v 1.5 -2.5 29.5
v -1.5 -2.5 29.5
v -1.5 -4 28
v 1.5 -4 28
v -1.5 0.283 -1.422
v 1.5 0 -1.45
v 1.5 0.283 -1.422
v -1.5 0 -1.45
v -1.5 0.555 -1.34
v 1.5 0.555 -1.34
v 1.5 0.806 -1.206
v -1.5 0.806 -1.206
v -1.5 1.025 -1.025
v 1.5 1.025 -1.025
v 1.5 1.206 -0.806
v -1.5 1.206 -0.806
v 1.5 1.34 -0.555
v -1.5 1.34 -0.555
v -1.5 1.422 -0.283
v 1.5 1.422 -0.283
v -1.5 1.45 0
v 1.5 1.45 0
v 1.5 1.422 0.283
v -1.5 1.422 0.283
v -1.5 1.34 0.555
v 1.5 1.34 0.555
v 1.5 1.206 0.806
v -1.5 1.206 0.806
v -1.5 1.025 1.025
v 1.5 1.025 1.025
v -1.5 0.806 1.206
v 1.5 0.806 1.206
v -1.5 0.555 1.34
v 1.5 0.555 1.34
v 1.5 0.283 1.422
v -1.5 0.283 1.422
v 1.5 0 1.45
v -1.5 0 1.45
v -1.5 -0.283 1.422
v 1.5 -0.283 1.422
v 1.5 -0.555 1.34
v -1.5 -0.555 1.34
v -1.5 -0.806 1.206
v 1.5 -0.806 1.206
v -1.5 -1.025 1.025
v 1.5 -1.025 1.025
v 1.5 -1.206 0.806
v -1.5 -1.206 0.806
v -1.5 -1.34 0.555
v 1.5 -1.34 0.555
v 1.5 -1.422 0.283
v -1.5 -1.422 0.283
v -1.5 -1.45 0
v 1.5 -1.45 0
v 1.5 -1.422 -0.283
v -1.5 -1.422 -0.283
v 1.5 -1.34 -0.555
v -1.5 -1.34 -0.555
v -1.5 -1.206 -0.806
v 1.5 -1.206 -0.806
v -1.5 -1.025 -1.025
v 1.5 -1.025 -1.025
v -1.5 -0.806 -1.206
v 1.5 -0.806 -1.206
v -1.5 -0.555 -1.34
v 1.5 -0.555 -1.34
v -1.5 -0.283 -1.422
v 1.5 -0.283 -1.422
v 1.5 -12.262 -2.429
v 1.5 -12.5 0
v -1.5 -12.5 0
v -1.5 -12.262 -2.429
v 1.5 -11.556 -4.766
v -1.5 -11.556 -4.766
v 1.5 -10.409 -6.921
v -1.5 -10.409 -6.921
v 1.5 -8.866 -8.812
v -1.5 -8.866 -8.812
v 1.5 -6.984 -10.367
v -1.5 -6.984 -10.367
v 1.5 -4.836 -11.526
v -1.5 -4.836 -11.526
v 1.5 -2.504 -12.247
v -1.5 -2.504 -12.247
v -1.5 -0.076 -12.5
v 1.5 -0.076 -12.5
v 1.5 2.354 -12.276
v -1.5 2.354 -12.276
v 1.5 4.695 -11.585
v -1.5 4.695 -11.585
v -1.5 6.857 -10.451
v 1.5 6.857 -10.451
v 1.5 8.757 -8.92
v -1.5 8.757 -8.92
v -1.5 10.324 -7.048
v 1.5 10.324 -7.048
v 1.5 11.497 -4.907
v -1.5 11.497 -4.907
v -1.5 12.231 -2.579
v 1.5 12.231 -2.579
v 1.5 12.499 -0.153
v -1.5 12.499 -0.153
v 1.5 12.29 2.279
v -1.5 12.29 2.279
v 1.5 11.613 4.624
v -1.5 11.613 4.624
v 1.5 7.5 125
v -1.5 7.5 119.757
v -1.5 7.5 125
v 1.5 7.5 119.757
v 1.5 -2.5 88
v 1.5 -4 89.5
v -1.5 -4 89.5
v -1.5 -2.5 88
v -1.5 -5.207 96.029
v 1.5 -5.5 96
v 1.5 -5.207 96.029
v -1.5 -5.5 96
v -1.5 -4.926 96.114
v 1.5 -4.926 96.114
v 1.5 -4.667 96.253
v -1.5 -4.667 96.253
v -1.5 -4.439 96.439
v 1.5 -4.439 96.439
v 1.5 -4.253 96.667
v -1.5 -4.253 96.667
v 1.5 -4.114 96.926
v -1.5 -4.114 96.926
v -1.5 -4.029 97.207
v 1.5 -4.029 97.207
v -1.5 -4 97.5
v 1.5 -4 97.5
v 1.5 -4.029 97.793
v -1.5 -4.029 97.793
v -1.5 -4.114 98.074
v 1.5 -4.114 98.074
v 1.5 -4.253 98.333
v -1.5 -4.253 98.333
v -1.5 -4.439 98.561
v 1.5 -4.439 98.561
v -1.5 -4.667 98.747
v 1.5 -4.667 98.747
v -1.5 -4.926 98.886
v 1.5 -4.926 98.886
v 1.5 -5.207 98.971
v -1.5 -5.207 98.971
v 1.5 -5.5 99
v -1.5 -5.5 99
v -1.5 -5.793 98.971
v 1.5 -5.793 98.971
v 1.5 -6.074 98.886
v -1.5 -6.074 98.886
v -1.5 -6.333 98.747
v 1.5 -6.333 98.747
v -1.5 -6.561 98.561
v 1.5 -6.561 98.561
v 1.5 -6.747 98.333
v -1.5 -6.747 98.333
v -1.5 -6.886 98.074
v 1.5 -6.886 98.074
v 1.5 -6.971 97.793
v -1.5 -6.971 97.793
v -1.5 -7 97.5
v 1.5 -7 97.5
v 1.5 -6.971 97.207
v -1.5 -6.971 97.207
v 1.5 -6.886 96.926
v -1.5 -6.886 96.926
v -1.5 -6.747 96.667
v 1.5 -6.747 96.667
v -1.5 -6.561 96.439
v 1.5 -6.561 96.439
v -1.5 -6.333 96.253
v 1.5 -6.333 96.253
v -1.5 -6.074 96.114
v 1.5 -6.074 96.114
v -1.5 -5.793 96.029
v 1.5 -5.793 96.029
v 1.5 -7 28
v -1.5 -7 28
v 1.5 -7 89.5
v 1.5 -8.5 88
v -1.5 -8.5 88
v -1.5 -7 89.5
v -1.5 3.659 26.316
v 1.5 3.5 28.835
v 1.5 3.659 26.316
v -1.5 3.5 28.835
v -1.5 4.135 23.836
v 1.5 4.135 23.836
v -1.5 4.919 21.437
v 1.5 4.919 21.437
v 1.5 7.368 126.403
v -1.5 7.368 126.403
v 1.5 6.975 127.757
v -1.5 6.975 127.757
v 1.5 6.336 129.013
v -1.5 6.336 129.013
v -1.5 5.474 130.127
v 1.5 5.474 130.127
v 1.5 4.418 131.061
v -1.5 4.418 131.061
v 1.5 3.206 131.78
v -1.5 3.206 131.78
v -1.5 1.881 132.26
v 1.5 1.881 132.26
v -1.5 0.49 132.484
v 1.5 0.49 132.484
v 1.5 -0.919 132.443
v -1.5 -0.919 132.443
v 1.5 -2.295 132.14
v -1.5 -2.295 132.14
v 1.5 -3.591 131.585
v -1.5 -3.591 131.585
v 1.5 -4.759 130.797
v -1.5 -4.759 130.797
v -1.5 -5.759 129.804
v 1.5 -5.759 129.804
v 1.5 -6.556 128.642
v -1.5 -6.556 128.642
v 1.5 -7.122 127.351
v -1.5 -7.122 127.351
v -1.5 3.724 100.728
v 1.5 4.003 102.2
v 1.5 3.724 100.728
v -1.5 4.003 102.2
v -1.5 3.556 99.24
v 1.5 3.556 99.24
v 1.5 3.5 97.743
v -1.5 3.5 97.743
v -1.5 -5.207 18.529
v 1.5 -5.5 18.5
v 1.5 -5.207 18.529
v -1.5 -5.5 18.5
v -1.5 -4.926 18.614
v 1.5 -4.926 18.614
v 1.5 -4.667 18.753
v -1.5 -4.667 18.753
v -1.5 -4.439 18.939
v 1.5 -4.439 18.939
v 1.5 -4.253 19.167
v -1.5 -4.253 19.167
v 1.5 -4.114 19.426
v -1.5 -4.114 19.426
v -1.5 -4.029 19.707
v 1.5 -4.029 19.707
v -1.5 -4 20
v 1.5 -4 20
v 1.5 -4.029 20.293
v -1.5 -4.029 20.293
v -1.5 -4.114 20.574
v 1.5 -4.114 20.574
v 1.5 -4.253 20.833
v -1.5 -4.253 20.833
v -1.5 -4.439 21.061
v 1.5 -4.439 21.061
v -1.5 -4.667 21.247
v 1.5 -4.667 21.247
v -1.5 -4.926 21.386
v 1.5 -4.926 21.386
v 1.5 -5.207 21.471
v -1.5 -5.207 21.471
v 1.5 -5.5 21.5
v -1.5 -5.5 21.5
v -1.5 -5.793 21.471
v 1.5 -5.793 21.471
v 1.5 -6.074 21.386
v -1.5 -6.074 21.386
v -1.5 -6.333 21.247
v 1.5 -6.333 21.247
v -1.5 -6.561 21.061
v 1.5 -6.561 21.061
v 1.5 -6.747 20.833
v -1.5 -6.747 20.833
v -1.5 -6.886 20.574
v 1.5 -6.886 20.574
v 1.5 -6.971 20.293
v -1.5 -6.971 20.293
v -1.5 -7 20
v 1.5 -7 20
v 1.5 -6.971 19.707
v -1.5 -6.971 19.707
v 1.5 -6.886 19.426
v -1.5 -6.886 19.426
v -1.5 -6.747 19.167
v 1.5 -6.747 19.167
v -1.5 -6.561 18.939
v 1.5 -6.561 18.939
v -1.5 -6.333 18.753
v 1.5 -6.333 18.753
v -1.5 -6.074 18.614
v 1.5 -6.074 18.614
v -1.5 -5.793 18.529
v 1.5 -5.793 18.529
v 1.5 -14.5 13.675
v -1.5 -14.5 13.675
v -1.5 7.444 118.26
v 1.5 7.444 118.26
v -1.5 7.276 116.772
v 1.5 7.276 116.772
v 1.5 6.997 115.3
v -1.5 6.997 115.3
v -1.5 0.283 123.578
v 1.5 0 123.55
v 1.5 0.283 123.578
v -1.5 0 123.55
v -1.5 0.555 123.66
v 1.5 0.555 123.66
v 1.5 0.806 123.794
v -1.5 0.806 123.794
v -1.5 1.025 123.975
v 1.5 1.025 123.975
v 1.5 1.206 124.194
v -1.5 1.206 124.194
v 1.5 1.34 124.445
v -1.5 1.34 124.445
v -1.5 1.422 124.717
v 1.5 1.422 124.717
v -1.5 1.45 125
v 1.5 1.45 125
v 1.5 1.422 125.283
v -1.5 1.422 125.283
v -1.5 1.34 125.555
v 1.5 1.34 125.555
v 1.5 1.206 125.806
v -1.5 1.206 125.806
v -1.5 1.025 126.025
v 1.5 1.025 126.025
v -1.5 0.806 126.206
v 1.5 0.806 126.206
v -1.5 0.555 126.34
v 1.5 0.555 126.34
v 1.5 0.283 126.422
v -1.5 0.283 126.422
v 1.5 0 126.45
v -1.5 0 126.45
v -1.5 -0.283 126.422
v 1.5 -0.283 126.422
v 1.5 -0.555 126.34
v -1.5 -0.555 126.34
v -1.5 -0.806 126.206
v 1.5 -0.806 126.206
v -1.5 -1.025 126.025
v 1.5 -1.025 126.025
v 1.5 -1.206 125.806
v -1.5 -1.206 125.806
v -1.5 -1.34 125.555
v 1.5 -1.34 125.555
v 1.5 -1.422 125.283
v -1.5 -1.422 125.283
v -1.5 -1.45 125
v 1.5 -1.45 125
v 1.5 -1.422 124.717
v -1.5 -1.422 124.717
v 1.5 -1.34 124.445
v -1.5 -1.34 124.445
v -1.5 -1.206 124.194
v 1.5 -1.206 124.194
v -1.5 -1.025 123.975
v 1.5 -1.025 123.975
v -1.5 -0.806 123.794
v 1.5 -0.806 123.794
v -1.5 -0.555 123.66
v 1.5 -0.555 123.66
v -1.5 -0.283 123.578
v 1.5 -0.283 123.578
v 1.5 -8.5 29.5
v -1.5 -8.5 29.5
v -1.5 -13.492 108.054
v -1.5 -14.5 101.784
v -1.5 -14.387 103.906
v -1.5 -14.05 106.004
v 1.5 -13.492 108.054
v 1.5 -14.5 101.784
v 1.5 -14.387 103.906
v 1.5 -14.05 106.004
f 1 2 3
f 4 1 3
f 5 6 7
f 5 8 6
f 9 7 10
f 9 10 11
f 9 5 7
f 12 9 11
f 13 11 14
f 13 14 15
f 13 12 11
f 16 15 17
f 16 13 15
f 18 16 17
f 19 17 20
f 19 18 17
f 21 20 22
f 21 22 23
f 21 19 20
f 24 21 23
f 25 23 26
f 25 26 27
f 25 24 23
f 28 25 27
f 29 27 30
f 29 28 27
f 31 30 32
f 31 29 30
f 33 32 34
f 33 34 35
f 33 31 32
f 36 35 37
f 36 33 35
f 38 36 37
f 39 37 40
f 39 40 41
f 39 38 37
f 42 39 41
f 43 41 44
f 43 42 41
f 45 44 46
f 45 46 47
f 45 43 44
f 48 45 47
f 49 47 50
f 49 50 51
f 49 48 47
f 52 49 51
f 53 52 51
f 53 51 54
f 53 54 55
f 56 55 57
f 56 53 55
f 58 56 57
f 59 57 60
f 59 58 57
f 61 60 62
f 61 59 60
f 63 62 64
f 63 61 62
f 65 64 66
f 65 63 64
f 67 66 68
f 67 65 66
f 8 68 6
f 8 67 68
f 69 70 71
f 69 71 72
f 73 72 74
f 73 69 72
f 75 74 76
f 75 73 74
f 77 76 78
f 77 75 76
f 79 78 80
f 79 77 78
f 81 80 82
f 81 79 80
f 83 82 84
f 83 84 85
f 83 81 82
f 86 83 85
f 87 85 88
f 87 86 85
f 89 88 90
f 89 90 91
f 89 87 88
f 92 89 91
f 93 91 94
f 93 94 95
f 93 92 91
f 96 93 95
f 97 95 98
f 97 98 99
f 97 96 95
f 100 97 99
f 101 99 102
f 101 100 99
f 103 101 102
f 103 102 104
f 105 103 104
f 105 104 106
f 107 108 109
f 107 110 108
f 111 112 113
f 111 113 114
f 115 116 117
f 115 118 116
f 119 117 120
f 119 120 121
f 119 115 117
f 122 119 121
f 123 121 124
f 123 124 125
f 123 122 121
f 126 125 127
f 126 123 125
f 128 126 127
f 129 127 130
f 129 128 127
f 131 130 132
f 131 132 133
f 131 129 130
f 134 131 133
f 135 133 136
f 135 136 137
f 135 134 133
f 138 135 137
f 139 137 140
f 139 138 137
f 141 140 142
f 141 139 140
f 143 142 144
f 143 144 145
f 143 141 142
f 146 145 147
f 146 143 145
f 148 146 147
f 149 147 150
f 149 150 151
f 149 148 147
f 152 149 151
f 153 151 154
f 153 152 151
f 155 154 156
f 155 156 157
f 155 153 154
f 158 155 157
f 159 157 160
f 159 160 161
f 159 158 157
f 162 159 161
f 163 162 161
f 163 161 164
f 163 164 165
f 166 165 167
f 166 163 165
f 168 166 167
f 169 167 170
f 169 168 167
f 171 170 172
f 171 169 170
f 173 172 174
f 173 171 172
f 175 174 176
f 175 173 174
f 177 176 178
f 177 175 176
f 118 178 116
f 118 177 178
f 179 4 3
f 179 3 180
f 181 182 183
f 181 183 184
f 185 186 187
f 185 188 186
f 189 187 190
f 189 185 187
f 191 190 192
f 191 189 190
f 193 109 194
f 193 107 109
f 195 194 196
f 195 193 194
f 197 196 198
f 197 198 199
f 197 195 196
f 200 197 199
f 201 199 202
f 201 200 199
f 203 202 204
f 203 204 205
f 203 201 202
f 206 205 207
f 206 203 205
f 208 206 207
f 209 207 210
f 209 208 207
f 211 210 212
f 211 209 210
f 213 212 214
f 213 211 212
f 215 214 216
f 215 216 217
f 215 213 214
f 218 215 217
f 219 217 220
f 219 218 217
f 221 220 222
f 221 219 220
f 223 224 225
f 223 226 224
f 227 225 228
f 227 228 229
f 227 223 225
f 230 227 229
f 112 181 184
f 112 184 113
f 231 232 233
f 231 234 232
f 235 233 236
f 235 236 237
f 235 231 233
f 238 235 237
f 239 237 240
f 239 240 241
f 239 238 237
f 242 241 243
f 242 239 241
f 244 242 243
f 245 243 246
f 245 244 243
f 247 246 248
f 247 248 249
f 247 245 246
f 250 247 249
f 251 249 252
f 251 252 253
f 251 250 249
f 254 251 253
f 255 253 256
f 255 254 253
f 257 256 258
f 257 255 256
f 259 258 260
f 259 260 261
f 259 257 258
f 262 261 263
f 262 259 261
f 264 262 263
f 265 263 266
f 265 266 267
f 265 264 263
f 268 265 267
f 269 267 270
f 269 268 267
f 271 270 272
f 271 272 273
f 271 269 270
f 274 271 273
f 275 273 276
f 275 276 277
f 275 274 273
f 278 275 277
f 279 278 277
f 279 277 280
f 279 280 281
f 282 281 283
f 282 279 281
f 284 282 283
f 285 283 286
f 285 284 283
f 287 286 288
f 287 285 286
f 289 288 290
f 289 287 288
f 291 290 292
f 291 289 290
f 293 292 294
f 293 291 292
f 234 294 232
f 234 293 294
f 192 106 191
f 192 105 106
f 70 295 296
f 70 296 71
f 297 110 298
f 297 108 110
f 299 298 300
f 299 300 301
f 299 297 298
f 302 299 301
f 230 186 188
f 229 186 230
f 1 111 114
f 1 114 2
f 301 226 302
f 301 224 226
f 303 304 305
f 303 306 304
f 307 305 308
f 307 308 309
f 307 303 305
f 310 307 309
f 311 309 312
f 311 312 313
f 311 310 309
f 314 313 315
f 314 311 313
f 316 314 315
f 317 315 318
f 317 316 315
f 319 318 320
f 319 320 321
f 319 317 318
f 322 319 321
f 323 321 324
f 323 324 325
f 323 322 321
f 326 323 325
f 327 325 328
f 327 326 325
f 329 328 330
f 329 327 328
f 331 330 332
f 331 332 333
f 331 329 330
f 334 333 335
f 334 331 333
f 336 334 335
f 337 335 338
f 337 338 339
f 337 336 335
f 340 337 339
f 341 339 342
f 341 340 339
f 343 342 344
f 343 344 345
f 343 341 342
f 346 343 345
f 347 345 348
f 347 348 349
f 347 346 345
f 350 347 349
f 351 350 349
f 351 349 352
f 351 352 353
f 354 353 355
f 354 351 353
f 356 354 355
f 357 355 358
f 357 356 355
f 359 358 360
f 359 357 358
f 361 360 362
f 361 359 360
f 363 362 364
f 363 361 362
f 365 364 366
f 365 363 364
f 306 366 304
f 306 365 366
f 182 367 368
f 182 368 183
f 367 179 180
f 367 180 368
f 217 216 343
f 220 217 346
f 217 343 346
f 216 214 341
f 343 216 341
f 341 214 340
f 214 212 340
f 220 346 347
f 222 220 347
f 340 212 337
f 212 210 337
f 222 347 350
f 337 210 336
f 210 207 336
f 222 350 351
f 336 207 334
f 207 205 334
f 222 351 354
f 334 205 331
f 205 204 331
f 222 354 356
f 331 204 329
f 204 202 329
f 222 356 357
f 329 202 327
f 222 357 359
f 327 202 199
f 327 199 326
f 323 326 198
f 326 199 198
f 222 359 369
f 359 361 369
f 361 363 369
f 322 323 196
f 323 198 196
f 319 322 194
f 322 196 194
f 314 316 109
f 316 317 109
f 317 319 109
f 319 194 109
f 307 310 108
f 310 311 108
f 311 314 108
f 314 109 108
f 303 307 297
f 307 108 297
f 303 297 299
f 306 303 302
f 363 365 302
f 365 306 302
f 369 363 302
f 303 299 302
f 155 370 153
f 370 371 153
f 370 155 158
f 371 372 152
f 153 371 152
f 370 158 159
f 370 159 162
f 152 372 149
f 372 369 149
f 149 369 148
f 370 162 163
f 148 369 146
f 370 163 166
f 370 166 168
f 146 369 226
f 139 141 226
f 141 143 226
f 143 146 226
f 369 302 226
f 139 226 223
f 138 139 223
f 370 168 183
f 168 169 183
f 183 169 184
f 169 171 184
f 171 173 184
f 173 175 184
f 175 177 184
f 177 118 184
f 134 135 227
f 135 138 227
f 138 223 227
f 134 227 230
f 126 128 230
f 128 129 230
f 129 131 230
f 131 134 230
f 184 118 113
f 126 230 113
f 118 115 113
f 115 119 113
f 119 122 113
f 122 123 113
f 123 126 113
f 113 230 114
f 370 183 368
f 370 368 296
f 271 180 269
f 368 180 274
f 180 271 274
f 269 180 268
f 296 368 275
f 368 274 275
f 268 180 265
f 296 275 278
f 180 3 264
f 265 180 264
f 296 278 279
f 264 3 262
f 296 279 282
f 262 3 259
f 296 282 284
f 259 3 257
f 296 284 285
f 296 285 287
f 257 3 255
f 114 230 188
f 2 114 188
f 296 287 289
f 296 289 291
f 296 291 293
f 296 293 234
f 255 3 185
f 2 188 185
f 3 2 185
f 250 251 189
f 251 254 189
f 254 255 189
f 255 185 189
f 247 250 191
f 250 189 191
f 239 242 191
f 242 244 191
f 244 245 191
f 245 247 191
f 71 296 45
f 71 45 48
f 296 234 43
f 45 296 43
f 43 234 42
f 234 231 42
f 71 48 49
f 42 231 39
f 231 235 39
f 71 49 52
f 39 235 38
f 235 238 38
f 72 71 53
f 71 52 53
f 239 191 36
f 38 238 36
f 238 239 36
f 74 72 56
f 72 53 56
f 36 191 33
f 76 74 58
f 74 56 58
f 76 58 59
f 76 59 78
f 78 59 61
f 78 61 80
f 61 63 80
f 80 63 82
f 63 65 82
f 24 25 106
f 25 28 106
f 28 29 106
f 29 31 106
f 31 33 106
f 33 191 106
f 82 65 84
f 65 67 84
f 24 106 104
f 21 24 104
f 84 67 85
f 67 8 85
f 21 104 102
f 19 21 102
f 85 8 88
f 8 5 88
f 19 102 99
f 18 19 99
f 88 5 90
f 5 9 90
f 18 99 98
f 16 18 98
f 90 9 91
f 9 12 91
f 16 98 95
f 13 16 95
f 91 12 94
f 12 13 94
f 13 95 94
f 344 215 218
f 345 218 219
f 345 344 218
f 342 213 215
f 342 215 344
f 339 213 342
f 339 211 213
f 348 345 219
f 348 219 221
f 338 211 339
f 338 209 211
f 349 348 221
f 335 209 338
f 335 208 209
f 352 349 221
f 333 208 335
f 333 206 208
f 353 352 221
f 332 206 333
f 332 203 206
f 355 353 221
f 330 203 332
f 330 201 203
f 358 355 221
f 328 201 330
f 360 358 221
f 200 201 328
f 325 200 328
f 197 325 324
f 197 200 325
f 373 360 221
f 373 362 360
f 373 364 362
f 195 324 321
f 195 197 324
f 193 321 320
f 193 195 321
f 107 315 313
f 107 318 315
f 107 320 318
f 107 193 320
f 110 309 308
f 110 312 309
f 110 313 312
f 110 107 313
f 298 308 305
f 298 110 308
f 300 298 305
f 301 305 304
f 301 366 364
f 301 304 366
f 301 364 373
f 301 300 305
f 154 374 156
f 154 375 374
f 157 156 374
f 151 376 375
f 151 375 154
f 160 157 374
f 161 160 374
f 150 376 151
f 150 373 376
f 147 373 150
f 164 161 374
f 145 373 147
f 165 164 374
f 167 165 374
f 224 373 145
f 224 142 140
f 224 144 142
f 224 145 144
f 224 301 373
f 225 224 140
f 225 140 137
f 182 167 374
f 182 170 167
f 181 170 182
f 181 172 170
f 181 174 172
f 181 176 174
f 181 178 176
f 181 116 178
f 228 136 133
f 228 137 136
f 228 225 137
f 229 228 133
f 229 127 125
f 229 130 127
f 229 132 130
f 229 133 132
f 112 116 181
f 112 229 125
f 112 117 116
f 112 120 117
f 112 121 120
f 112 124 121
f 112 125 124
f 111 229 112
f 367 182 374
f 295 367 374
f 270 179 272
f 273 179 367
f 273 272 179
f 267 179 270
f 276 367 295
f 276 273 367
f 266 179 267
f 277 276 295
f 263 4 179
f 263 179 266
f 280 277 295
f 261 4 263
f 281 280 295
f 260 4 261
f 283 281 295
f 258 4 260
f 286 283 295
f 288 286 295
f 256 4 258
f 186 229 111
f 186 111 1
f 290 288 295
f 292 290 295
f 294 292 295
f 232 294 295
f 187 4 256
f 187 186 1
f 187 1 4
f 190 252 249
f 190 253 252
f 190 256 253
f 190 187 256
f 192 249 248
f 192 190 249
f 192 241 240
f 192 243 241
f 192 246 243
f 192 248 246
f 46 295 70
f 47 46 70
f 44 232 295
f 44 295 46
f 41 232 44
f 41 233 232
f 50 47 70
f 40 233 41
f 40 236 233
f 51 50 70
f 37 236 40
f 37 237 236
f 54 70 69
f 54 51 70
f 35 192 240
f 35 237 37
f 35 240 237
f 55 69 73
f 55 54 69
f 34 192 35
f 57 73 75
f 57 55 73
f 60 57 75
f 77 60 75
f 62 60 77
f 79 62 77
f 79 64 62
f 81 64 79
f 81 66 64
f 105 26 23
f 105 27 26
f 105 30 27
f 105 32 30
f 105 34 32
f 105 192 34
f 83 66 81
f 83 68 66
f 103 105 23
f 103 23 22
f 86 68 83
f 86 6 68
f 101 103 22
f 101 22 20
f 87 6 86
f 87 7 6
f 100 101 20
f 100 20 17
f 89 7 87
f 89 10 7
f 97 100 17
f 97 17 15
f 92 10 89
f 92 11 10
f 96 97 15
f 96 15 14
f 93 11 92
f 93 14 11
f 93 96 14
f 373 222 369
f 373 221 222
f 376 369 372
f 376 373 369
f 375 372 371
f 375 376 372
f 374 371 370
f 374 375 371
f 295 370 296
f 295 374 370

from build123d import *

# Parameters (mm, degrees)
SKETCH1_R           = 1.5
SKETCH1_R_2         = 1.45
BOSS_EXTRUDE1_DEPTH = 1.5
FILLET1_R           = 20


with BuildPart() as part:
    # Sketch1 → Boss-Extrude1 (new body, symmetric)
    with BuildSketch(Plane(origin=(0, 0, 0), x_dir=(0, 0, -1), z_dir=(1, 0, 0))):
        with BuildLine():
            Line((-127.350956164, -7.122008503), (-105, -14.5))
            Line((-105, -14.5), (-13.675, -14.5))
            Line((-13.675, -14.5), (0, -12.5))
            ThreePointArc((0, -12.5), (12.276307634, 2.354202809), (-4.624146867, 11.613236661))
            Line((-4.624146867, 11.613236661), (-25, 3.5))
            Line((-25, 3.5), (-100, 3.5))
            Line((-100, 3.5), (-117.5, 7.5))
            Line((-117.5, 7.5), (-125, 7.5))
            ThreePointArc((-125, 7.5), (-132.404899181, 1.190574699), (-127.350956164, -7.122008503))
        make_face()
        with Locations((-97.5, -5.5)):
            Circle(SKETCH1_R, mode=Mode.SUBTRACT)
        Polygon((-89.5, -7), (-89.5, -4), (-88, -2.5), (-29.5, -2.5), (-28, -4), (-28, -7), (-29.5, -8.5), (-88, -8.5), align=None, mode=Mode.SUBTRACT)
        with Locations((-20, -5.5)):
            Circle(SKETCH1_R, mode=Mode.SUBTRACT)
        with Locations((-125, 0)):
            Circle(SKETCH1_R_2, mode=Mode.SUBTRACT)
        Circle(SKETCH1_R_2, mode=Mode.SUBTRACT)
    extrude(amount=BOSS_EXTRUDE1_DEPTH, both=True)

    # Fillet1
    fillet1_edges = [part.edges().sort_by_distance(p)[0] for p in [
        (0, -14.5, 105),
        (0, 7.5, 117.5),
        (0, 3.5, 100),
        (0, 3.5, 25),
    ]]
    fillet(fillet1_edges, radius=FILLET1_R)


solid = part.part
